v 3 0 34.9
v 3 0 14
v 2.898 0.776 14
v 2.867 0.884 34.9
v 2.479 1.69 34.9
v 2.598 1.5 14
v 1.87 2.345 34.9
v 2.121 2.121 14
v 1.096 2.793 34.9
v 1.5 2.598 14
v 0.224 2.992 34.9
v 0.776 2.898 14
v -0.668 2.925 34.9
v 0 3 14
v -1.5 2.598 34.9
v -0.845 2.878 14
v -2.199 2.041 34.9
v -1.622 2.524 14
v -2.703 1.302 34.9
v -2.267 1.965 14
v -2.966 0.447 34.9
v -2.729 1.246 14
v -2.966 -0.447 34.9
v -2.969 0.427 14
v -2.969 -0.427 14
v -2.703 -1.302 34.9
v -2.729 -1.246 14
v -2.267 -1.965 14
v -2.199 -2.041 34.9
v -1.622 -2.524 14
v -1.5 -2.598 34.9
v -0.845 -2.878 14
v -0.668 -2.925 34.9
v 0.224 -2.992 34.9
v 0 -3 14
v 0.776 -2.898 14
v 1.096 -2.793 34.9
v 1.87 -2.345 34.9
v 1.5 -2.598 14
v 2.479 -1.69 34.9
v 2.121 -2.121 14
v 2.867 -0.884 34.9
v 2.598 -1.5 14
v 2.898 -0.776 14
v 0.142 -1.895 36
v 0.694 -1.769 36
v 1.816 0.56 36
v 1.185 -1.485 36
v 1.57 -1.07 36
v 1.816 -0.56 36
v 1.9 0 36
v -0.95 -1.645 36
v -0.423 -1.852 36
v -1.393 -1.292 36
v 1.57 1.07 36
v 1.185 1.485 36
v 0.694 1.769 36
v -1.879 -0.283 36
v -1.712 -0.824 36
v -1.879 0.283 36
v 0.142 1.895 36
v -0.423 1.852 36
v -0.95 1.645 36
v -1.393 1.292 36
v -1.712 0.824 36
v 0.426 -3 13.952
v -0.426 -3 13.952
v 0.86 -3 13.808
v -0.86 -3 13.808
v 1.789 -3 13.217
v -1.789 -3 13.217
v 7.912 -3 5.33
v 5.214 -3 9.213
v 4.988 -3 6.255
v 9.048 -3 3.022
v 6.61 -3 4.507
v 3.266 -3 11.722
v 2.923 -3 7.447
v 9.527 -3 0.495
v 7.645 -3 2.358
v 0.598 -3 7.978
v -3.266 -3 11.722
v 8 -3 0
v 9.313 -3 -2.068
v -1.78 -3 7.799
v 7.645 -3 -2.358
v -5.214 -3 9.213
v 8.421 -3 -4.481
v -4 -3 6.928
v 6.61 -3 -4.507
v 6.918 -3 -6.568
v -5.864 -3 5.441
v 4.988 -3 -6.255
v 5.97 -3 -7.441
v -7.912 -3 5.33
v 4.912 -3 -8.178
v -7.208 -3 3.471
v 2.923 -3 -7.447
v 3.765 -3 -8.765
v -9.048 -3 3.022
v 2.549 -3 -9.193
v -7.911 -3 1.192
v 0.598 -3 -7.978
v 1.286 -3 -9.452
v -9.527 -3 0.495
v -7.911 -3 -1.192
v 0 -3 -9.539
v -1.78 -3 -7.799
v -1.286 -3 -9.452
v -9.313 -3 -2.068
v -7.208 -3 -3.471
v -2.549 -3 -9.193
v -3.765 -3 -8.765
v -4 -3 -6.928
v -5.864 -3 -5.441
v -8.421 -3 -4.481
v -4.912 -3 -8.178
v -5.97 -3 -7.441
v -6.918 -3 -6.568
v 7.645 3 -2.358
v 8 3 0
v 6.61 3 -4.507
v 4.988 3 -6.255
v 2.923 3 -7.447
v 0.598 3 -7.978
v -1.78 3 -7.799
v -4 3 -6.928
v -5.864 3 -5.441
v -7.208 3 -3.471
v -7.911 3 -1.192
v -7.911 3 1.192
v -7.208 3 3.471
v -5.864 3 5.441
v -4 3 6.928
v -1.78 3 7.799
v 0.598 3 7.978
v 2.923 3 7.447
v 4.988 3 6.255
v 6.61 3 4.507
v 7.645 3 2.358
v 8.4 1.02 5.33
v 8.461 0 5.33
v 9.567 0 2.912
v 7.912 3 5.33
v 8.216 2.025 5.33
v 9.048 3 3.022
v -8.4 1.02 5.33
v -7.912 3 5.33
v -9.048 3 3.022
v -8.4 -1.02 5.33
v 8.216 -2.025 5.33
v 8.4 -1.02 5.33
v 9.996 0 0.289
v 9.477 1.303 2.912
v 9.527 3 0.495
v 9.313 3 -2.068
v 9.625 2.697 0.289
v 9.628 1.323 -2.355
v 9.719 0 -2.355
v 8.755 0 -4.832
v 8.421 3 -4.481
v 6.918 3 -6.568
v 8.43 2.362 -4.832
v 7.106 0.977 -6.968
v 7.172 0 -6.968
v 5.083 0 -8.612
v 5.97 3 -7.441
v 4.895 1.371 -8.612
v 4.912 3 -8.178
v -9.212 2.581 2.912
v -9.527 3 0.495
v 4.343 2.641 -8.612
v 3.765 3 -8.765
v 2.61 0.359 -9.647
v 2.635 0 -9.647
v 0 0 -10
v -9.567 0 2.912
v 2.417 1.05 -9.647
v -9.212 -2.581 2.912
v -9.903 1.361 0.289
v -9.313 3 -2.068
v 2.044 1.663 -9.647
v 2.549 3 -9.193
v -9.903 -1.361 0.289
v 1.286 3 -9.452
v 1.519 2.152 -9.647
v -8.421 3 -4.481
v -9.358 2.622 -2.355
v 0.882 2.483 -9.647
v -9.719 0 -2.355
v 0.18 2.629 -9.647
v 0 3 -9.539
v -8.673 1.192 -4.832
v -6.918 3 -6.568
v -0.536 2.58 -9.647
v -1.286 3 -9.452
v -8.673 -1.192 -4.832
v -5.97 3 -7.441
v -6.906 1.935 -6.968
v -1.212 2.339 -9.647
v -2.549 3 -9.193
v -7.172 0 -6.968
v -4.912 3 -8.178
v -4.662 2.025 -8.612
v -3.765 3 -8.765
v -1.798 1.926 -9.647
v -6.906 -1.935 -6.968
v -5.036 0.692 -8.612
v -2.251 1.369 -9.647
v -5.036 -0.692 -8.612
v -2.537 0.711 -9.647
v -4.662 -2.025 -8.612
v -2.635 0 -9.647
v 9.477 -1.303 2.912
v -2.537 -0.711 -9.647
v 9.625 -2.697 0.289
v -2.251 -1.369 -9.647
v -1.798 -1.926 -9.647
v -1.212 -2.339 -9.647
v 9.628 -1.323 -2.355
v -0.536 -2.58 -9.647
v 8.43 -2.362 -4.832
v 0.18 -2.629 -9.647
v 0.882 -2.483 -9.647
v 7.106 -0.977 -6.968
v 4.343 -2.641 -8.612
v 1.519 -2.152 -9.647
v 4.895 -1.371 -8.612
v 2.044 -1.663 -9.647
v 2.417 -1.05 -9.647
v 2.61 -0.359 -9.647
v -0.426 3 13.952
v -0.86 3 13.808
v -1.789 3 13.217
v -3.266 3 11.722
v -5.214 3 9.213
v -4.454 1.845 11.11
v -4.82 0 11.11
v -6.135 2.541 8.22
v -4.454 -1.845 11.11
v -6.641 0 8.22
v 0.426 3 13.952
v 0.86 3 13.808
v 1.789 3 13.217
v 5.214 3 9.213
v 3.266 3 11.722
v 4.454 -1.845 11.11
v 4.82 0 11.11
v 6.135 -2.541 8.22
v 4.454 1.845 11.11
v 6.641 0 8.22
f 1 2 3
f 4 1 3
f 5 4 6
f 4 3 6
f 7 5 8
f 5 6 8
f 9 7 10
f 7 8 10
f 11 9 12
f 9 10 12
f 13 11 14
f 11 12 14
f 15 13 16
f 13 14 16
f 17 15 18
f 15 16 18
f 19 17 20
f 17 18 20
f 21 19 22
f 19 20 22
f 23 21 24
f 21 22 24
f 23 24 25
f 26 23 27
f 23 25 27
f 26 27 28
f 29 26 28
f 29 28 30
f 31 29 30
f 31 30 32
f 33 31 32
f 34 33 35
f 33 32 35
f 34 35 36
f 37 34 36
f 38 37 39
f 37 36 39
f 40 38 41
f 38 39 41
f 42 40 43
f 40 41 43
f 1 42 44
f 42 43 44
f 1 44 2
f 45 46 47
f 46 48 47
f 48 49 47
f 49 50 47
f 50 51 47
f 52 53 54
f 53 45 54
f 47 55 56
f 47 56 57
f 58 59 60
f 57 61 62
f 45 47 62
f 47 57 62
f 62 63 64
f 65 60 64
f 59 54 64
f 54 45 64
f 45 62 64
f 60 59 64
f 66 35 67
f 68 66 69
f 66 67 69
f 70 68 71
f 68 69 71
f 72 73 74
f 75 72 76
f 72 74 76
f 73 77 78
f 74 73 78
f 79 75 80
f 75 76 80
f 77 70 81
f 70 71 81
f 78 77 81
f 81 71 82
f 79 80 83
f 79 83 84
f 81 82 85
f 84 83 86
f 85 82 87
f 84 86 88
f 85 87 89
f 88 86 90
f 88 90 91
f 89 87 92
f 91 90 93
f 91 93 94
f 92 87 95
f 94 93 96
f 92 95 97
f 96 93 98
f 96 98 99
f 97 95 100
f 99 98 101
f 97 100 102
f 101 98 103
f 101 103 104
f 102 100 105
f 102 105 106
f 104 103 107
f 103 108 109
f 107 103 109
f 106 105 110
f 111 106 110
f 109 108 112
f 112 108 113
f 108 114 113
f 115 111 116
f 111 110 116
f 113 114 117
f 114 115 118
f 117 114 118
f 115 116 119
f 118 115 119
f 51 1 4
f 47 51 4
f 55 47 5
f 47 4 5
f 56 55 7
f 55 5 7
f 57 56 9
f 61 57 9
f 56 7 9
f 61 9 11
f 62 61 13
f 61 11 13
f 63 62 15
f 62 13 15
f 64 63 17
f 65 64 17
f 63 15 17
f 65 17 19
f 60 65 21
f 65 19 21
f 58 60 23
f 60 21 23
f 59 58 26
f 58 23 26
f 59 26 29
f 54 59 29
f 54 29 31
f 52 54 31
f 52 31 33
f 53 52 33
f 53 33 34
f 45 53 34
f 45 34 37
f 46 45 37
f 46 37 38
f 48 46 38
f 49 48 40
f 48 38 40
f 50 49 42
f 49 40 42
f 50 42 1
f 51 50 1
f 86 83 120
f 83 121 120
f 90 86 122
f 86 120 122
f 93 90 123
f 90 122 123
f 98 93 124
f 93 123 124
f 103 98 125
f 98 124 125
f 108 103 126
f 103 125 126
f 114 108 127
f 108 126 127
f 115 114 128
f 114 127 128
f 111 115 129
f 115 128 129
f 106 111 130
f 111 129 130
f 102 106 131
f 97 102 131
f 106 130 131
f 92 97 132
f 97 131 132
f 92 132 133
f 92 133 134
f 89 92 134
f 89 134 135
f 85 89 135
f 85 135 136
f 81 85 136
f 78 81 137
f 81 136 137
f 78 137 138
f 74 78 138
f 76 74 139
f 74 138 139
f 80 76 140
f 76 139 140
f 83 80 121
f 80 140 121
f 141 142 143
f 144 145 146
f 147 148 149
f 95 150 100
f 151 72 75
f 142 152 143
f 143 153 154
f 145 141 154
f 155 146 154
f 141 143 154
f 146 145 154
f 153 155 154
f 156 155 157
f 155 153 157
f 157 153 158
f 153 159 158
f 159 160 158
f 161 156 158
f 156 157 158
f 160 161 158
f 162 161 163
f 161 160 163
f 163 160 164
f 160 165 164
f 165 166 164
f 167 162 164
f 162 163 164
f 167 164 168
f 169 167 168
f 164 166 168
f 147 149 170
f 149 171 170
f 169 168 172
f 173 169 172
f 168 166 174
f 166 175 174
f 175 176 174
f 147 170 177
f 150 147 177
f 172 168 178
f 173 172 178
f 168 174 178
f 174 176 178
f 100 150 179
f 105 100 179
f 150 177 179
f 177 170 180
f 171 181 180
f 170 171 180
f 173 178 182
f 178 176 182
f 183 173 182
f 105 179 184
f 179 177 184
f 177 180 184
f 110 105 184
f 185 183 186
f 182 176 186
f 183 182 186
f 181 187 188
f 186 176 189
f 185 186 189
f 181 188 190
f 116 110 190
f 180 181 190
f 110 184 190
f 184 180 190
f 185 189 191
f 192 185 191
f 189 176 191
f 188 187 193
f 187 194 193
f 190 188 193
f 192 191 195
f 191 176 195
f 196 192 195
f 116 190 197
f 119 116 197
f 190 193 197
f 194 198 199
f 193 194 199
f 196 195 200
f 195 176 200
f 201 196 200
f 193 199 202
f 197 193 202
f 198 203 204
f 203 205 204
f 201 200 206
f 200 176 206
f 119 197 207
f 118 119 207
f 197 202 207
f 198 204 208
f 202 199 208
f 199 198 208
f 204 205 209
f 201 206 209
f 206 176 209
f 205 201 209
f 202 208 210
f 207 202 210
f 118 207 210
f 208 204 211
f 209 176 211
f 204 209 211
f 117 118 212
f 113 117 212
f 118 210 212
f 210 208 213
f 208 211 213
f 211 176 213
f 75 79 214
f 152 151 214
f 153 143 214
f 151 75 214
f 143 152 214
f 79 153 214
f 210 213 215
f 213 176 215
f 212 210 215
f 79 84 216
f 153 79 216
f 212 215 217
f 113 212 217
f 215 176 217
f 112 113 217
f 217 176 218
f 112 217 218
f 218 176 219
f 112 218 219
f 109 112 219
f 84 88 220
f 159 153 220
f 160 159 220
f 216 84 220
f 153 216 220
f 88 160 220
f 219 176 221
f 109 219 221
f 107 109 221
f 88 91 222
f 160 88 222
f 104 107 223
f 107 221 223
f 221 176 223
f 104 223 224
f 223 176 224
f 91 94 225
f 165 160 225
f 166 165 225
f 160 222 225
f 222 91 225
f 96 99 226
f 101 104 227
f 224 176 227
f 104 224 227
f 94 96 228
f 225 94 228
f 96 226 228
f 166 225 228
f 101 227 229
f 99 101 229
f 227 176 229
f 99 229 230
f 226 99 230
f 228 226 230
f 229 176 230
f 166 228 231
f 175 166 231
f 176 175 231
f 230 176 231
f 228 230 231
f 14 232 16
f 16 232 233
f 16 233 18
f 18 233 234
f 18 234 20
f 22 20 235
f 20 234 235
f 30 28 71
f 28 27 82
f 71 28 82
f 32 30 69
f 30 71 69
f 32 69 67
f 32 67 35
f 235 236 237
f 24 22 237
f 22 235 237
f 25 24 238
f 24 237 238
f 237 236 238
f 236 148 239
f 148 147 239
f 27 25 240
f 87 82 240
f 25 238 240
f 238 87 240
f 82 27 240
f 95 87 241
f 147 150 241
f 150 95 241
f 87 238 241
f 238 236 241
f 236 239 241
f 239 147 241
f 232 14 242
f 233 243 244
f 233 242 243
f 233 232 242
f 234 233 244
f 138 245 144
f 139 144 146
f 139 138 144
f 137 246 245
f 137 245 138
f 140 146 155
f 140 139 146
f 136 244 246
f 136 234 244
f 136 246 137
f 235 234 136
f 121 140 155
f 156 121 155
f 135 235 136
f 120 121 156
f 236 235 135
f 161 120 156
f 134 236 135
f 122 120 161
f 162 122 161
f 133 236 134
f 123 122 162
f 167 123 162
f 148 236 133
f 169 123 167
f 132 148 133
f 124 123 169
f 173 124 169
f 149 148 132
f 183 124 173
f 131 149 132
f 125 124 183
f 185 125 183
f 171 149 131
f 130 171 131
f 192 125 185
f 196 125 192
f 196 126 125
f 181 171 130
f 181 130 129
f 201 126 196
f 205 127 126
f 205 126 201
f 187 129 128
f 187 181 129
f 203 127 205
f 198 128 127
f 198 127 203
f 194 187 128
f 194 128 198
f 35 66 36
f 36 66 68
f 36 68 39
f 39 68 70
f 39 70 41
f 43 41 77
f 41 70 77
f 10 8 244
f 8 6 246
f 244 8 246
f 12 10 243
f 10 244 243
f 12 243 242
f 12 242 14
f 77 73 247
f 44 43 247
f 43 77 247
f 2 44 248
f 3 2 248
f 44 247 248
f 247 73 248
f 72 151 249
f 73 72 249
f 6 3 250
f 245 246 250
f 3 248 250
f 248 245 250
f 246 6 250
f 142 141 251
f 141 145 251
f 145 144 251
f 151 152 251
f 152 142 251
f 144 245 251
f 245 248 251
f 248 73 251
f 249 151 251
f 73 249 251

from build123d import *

# Parameters (mm, degrees)
SZKIC1_W                        = 3
SZKIC1_H                        = 22
WYTNIJ_WYCI_GNI_CIE1_DEPTH      = 11
WYTNIJ_WYCI_GNI_CIE1_DEPTH_BACK = 11
SZKIC3_R                        = 8
WYTNIJ_WYCI_GNI_CIE2_DEPTH      = 4
WYTNIJ_WYCI_GNI_CIE2_DEPTH_BACK = 4
SFAZOWANIE1_SIZE                = 1.1


with BuildPart() as part:
    # Szkic1 → Obrót1 (revolve)
    with BuildSketch(Plane(origin=(0, 0, 0), x_dir=(1, 0, 0), z_dir=(0, 1, 0))):
        with BuildLine():
            Line((0, 10), (0, -14))
            Line((0, -14), (3, -14))
            Line((3, -14), (8.46133223, -5.329714522))
            ThreePointArc((8.46133223, -5.329714522), (8.754917053, 4.832331465), (0, 10))
        make_face()
        with Locations((1.5, -25)):
            Rectangle(SZKIC1_W, SZKIC1_H)
    revolve(axis=Axis((0, 0, -26.043516498), (0, 0, 1)))

    # Szkic2 → Wytnij-wyciągnięcie1 (cut, two sides)
    with BuildSketch(Plane(origin=(0, 0, 0), x_dir=(0, 0, -1), z_dir=(1, 0, 0))) as wytnij_wyci_gni_cie1_sk:
        with BuildLine():
            Line((-14, 3), (9.539392014, 3))
            ThreePointArc((9.539392014, 3), (3.447736008, 9.386858709), (-5.329714522, 8.46133223))
            Line((-5.329714522, 8.46133223), (-14, 3))
        make_face()
        with BuildLine():
            Line((-14, -3), (9.539392014, -3))
            ThreePointArc((9.539392014, -3), (3.447736008, -9.386858709), (-5.329714522, -8.46133223))
            Line((-5.329714522, -8.46133223), (-14, -3))
        make_face()
    extrude(amount=WYTNIJ_WYCI_GNI_CIE1_DEPTH, mode=Mode.SUBTRACT)
    extrude(wytnij_wyci_gni_cie1_sk.sketch, amount=-WYTNIJ_WYCI_GNI_CIE1_DEPTH_BACK, mode=Mode.SUBTRACT)

    # Szkic3 → Wytnij-wyciągnięcie2 (cut, two sides)
    with BuildSketch(Plane(origin=(0, 0, 0), x_dir=(1, 0, 0), z_dir=(0, 1, 0))) as wytnij_wyci_gni_cie2_sk:
        Circle(SZKIC3_R)
    extrude(amount=WYTNIJ_WYCI_GNI_CIE2_DEPTH, mode=Mode.SUBTRACT)
    extrude(wytnij_wyci_gni_cie2_sk.sketch, amount=-WYTNIJ_WYCI_GNI_CIE2_DEPTH_BACK, mode=Mode.SUBTRACT)

    # Sfazowanie1
    sfazowanie1_edges = [part.edges().sort_by_distance(p)[0] for p in [
        (-3, 0, 36),
    ]]
    chamfer(sfazowanie1_edges, length=SFAZOWANIE1_SIZE)


solid = part.part
